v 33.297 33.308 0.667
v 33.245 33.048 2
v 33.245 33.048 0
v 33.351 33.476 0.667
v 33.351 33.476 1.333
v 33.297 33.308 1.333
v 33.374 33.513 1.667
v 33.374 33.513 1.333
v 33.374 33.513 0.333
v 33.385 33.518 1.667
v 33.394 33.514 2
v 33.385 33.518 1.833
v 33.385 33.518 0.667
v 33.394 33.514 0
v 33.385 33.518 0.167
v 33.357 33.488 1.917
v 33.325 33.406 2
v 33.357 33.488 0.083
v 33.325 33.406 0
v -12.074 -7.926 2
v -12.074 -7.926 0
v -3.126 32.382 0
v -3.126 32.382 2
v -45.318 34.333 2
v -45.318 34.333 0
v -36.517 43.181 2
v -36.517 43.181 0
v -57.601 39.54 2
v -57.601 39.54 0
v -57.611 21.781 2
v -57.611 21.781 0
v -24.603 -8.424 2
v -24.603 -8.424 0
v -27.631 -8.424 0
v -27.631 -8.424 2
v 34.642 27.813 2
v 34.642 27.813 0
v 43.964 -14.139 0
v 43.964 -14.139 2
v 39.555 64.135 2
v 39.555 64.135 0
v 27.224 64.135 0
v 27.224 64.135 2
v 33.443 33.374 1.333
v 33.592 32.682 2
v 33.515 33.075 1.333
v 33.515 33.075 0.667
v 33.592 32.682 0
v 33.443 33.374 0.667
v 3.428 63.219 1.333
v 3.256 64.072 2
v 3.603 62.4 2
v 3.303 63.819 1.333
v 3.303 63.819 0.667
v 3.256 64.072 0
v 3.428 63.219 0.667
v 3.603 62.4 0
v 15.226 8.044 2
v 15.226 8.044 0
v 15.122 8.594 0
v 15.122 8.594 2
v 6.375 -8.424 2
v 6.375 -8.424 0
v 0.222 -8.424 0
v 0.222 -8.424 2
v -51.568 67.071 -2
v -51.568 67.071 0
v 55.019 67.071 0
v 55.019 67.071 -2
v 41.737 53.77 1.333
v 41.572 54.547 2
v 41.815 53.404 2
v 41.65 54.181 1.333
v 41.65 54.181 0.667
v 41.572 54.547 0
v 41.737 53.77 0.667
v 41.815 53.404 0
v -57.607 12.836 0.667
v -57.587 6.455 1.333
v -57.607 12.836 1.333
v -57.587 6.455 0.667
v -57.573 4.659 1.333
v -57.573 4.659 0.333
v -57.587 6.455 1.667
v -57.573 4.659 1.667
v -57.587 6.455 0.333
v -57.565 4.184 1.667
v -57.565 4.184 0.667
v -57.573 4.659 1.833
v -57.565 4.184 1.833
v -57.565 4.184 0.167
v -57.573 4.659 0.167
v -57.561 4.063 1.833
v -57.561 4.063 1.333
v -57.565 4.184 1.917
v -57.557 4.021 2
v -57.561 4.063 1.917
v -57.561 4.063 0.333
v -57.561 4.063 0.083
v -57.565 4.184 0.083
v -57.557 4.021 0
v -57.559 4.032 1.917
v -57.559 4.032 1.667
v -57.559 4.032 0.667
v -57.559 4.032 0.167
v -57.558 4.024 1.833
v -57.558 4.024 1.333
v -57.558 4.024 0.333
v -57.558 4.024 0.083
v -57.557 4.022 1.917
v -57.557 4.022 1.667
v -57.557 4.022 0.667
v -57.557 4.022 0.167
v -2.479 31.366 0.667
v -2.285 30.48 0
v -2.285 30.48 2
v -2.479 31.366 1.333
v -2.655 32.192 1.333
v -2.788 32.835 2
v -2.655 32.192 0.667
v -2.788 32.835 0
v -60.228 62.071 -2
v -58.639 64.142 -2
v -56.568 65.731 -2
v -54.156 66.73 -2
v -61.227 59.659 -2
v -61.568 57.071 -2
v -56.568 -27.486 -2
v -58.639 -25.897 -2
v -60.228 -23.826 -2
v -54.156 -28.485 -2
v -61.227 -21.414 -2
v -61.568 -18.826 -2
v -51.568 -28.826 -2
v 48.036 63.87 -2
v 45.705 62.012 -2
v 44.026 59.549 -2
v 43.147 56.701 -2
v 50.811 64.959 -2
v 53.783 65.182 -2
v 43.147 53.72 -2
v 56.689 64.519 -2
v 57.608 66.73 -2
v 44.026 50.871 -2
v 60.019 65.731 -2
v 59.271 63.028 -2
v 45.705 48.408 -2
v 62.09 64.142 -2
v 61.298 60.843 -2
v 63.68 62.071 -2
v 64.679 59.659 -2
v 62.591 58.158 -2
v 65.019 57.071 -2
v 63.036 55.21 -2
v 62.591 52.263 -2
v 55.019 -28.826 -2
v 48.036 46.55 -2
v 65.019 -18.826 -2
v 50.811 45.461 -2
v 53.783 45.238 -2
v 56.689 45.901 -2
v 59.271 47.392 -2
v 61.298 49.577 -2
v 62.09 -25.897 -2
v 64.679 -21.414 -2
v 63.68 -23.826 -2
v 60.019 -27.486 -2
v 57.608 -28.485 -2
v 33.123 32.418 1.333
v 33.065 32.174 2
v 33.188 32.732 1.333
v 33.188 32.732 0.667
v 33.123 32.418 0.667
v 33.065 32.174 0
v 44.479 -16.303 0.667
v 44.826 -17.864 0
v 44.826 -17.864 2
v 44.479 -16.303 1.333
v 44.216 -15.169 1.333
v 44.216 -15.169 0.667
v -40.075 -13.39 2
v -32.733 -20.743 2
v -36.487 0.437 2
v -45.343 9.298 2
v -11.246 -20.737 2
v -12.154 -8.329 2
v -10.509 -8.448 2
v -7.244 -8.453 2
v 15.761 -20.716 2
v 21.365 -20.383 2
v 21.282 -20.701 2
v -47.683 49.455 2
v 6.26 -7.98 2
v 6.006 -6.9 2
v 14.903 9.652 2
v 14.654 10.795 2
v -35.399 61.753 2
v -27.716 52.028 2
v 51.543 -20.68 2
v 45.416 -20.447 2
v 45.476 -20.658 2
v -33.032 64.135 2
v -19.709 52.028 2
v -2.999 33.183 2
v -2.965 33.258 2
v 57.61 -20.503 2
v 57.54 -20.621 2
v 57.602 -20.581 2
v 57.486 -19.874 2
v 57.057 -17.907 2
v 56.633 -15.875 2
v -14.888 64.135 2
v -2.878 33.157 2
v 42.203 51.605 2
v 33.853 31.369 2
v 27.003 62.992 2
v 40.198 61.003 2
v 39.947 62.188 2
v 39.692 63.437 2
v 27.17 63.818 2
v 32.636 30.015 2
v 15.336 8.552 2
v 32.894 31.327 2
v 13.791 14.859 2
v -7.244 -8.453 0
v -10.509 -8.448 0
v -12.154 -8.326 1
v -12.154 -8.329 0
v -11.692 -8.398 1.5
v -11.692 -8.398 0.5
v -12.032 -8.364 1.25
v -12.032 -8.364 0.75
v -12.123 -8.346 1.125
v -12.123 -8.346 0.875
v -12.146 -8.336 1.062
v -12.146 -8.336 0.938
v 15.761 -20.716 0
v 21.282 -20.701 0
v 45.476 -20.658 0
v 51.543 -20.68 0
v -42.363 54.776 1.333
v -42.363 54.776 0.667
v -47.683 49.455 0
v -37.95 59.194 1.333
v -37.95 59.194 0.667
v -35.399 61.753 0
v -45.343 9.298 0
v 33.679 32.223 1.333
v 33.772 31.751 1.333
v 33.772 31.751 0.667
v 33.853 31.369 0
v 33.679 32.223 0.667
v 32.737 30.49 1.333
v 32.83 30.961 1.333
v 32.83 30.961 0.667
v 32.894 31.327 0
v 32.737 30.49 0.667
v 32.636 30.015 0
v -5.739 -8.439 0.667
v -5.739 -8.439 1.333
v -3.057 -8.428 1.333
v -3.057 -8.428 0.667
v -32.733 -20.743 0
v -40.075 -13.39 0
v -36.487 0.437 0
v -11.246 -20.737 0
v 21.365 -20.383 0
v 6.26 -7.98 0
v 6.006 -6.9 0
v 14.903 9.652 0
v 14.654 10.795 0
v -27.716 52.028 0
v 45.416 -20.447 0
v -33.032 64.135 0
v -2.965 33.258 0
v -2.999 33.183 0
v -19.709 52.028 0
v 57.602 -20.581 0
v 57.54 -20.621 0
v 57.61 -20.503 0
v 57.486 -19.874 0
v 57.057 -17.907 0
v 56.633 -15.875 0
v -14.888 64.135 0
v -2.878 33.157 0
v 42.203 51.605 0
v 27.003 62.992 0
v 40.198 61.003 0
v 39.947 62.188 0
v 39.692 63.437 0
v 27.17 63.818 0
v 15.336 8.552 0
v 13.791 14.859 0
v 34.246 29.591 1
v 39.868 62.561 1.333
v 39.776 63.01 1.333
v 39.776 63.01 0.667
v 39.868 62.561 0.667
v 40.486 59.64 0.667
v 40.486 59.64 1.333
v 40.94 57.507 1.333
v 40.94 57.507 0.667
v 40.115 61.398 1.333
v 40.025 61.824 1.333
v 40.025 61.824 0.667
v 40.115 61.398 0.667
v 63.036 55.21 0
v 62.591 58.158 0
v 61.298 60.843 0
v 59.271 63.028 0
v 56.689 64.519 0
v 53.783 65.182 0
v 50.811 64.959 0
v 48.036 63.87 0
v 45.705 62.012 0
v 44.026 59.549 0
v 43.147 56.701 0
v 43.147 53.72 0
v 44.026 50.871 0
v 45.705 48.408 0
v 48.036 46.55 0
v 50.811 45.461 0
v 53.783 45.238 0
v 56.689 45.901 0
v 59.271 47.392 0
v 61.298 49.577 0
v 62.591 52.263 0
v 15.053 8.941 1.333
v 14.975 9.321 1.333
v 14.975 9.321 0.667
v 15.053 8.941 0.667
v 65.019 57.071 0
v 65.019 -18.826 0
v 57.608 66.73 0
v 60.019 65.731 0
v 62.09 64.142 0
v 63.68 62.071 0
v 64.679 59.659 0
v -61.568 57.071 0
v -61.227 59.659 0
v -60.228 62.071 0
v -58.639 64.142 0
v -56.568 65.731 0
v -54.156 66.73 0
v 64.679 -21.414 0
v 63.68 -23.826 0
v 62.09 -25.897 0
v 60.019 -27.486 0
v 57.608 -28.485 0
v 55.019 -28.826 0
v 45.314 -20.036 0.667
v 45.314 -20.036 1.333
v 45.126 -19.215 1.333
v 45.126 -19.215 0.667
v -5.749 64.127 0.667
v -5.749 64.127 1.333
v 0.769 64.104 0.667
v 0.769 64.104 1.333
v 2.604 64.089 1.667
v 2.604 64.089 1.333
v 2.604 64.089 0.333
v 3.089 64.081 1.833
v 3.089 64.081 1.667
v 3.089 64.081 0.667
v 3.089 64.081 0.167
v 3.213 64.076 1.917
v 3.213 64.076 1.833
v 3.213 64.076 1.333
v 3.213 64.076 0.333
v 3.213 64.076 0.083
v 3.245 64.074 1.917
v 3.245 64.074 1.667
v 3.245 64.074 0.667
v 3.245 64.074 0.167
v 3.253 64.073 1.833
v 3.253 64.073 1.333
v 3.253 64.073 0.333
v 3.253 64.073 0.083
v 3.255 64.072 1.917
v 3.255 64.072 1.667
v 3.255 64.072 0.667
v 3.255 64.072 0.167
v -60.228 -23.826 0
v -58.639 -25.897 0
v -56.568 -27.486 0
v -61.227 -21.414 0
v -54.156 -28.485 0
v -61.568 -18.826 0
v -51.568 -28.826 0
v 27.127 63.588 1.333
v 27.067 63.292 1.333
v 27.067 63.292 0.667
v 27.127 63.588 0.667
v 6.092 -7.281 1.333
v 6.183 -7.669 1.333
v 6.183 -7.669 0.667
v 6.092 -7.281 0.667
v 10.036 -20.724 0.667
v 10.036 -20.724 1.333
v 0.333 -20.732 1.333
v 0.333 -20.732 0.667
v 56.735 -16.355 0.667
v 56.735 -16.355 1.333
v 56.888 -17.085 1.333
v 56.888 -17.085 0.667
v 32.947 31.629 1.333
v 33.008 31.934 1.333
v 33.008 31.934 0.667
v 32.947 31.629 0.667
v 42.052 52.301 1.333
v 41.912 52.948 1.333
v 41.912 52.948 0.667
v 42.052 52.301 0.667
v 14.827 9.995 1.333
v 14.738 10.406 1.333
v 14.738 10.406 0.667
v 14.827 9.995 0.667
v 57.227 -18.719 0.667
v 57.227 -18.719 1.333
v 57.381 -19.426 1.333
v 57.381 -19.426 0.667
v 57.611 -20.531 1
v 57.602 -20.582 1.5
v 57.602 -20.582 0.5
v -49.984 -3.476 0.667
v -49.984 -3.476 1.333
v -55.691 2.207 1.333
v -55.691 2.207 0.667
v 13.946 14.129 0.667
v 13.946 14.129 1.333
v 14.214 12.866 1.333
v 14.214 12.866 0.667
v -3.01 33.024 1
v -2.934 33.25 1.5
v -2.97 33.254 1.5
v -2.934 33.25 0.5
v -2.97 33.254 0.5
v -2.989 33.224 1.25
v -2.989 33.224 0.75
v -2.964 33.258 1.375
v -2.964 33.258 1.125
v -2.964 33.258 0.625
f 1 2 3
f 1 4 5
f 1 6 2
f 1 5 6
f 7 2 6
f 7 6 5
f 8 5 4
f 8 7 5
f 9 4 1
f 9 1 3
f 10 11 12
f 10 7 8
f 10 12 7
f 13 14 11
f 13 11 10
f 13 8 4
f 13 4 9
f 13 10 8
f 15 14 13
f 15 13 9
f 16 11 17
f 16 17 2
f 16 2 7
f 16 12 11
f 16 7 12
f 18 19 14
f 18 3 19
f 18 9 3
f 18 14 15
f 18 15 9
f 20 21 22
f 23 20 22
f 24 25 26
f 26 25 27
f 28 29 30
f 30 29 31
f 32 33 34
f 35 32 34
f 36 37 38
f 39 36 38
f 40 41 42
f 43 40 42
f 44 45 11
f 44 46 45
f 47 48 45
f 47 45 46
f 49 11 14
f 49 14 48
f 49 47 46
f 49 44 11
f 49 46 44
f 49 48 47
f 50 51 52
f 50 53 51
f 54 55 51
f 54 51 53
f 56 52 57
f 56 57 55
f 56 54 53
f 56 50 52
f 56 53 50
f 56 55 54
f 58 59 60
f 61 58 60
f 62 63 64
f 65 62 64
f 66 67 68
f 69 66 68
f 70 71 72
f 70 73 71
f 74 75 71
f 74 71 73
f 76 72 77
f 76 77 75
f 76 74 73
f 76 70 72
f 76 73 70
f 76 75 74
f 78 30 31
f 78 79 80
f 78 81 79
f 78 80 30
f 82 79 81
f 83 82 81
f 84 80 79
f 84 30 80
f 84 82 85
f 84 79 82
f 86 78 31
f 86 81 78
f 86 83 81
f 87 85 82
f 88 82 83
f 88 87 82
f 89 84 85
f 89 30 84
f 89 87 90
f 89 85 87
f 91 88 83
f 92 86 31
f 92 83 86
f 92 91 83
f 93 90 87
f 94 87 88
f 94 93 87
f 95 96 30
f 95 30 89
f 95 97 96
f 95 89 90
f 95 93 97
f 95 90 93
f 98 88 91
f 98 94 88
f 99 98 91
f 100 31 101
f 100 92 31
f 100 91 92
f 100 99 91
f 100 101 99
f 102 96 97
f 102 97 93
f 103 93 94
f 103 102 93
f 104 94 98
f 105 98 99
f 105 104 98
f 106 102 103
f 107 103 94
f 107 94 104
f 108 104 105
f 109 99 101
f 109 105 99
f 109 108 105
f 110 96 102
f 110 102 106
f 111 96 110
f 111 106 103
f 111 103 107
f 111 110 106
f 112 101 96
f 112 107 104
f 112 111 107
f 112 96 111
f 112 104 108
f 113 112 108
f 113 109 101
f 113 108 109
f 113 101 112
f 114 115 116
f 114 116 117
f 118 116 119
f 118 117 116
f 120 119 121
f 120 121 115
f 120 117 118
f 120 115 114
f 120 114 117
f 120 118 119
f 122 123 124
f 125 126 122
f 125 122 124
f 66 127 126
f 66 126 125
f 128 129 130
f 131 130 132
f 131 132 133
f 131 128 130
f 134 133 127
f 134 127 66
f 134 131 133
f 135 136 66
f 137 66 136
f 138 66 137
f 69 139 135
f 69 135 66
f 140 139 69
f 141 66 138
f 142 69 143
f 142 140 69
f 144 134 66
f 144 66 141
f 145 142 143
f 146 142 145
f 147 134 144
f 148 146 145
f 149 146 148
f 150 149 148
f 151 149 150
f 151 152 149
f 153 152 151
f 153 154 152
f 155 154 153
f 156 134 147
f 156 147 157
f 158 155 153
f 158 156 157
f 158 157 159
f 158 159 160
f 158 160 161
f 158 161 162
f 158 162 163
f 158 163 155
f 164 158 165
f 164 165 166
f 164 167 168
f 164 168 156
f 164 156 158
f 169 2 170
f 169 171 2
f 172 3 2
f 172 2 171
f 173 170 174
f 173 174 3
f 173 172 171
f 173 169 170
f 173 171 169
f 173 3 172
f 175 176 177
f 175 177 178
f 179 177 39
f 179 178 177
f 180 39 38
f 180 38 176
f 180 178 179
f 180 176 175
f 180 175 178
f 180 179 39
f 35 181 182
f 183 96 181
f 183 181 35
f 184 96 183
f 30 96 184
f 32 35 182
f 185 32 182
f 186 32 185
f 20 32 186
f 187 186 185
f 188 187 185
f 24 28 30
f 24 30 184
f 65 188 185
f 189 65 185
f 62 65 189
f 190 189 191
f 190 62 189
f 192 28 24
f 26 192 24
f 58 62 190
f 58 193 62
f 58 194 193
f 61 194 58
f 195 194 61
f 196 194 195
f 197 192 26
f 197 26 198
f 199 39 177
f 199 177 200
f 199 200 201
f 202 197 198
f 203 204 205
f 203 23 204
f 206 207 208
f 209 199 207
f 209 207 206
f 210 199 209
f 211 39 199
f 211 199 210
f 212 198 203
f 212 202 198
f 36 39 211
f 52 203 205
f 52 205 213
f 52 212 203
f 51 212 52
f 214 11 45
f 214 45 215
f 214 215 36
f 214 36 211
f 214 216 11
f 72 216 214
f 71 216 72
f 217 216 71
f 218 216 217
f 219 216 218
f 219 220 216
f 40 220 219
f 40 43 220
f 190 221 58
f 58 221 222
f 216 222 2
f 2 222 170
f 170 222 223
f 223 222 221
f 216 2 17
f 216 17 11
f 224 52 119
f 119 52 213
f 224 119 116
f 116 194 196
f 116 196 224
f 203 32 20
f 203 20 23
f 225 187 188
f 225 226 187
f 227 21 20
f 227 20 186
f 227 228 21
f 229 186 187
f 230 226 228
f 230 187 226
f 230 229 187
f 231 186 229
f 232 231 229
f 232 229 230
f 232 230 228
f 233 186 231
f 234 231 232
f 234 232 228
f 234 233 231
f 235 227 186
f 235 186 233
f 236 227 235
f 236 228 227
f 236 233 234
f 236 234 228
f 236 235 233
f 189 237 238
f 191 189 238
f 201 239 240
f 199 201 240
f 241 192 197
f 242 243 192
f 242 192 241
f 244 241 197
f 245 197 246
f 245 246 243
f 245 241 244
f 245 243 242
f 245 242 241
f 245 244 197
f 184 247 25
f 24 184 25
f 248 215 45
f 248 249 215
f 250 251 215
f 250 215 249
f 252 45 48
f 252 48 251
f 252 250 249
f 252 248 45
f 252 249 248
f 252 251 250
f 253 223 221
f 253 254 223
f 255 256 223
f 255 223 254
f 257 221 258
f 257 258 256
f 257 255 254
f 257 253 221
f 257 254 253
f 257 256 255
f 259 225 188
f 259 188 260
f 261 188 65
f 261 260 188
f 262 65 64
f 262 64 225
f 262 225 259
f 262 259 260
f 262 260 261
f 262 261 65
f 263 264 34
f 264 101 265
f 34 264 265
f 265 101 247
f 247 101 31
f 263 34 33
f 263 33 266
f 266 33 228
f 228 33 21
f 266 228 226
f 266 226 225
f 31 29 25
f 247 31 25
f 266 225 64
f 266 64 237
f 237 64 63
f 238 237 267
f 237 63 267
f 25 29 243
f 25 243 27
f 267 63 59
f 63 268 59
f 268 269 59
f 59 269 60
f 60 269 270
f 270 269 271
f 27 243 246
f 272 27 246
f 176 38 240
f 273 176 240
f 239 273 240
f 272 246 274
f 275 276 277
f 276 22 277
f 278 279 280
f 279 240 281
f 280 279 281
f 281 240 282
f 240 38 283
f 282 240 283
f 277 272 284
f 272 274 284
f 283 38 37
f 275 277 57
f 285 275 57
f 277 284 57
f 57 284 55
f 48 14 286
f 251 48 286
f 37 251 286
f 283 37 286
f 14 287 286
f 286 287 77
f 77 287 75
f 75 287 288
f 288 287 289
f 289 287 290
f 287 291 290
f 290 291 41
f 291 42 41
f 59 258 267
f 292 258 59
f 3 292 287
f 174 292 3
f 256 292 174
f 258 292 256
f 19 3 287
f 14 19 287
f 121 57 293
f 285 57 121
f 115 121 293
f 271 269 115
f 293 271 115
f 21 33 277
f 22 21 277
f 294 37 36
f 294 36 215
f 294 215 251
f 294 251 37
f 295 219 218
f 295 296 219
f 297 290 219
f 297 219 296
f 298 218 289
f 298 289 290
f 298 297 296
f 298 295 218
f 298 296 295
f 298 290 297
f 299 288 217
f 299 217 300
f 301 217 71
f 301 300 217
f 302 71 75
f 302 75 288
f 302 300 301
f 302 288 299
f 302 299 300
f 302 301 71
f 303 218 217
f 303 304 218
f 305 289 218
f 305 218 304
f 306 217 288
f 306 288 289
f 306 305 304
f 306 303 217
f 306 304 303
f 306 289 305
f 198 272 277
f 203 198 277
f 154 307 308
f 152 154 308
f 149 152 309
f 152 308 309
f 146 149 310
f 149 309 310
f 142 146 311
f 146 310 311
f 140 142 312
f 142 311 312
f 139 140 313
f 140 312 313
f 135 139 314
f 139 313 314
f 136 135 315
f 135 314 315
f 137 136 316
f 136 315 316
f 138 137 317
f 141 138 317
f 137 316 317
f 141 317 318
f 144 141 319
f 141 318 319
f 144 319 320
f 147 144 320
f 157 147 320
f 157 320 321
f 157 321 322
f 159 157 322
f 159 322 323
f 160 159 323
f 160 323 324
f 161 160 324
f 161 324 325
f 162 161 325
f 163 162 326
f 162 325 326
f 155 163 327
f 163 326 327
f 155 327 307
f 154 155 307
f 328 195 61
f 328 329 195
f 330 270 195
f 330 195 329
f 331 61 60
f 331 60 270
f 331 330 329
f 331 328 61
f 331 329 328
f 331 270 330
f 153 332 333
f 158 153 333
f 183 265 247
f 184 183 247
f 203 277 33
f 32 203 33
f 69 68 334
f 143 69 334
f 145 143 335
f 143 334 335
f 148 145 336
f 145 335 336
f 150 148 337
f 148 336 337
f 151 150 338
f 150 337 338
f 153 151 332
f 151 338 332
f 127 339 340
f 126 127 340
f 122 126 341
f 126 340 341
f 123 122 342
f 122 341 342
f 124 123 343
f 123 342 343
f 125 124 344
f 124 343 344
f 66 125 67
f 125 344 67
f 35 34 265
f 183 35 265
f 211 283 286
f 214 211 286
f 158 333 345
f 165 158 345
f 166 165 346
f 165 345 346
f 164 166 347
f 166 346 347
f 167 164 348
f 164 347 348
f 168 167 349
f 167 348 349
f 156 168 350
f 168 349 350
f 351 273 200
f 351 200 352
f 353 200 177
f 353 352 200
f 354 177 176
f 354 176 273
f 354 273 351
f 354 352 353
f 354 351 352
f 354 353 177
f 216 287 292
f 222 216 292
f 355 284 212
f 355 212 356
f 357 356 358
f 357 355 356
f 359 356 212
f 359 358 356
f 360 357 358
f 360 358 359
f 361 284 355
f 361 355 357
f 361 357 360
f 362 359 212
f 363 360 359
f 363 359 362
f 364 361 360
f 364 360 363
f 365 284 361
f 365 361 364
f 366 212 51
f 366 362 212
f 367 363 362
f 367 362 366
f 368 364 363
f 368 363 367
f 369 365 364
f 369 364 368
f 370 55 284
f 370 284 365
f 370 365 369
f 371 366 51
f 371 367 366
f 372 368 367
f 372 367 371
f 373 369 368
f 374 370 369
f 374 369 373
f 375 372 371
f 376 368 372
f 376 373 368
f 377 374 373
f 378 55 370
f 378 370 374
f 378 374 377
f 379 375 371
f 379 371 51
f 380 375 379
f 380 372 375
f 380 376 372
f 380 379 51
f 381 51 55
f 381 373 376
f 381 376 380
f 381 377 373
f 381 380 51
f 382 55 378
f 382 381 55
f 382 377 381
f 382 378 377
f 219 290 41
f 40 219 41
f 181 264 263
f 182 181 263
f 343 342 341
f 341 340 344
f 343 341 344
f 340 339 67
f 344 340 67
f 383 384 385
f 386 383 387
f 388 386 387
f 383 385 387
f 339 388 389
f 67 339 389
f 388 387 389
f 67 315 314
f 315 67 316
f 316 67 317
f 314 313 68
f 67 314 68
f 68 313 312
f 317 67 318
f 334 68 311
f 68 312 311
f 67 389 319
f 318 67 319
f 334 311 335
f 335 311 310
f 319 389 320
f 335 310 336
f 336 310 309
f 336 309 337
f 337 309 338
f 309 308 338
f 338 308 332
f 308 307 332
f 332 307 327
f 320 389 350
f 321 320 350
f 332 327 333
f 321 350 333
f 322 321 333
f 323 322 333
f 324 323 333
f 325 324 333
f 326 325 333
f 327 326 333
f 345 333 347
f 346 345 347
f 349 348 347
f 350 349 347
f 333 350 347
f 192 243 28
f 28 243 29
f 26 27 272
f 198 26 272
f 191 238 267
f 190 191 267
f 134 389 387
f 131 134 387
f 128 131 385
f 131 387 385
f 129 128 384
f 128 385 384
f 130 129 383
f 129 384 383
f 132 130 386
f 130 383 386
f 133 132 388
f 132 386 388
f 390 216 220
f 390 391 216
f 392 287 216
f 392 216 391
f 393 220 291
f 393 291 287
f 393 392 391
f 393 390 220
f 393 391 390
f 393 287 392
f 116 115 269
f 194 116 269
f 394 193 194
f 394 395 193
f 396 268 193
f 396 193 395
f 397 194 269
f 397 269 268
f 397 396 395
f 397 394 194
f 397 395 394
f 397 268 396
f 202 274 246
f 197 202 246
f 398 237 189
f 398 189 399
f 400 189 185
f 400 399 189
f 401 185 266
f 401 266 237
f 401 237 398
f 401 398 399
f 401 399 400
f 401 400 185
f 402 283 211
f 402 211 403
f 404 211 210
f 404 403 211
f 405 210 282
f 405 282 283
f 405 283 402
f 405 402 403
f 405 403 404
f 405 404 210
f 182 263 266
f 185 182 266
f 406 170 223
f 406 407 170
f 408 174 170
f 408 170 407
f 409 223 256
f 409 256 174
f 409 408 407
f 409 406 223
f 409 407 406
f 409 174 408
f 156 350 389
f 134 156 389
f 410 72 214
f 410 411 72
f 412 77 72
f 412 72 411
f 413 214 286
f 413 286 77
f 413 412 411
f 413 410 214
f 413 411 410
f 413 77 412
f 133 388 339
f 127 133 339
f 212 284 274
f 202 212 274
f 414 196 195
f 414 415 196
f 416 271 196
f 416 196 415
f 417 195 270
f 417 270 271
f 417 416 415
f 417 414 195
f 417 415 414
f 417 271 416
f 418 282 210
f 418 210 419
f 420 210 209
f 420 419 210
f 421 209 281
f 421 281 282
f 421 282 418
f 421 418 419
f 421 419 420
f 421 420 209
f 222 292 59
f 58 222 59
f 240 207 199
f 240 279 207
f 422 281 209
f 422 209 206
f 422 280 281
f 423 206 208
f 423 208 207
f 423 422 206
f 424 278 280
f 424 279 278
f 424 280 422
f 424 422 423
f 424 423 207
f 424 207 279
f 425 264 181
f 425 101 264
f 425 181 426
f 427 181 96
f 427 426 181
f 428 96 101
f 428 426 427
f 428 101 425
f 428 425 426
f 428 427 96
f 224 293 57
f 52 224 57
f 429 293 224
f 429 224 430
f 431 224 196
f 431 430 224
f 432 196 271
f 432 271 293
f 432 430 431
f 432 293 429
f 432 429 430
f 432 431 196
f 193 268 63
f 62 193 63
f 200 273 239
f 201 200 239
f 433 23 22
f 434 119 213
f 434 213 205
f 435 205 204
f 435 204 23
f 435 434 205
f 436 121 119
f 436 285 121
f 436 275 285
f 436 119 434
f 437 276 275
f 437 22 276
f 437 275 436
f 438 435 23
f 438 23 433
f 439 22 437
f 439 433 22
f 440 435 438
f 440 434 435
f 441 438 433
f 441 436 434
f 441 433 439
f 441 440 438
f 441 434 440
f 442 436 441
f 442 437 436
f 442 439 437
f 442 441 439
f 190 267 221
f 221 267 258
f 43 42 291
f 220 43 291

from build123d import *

# Parameters (mm, degrees)
F1_DEPTH = 2
F3_DEPTH = 2
F4_R     = 10
F5_DEPTH = 2


# Not quite as in the source:
# - ends of sketch curves that miss each other by under 0.0002 mm in the source are joined


with BuildPart() as f1:
    # F0 (on Top) → F1 (new body)
    with BuildSketch(Plane.XY):
        with BuildLine():
            Line((-57.600874, 39.53975), (-57.610532, 21.78092))
            add(Edge.make_bspline(
                [(-57.556676, 4.021483), (-57.591601, 4.021748), (-57.615837, 12.013561), (-57.610532, 21.78092)],
                knots=[0, 0, 0, 0, 1, 1, 1, 1], degree=3))
            add(Edge.make_bspline(
                [(-40.075238, -13.389783), (-52.206941, -1.240682), (-57.489675, 4.020846), (-57.556676, 4.021483)],
                knots=[0, 0, 0, 0, 1, 1, 1, 1], degree=3))
            Line((-40.075238, -13.389783), (-32.732625, -20.74289))
            Line((-32.732625, -20.74289), (-11.246228, -20.737043))
            add(Edge.make_bspline(
                [(15.761272, -20.715876), (12.72466, -20.724263), (0.571289, -20.733815), (-11.246228, -20.737043)],
                knots=[0, 0, 0, 0, 1, 1, 1, 1], degree=3))
            Line((15.761272, -20.715876), (21.282367, -20.700583))
            Line((21.282367, -20.700583), (21.365348, -20.383083))
            Line((21.365348, -20.383083), (32.636497, 30.01475))
            add(Edge.make_bspline(
                [(32.894223, 31.327084), (32.850424, 31.047684), (32.734449, 30.457134), (32.636497, 30.01475)],
                knots=[0, 0, 0, 0, 1, 1, 1, 1], degree=3))
            add(Edge.make_bspline(
                [(33.065223, 32.17375), (33.014973, 31.987484), (32.938019, 31.606484), (32.894223, 31.327084)],
                knots=[0, 0, 0, 0, 1, 1, 1, 1], degree=3))
            add(Edge.make_bspline(
                [(33.244505, 33.048222), (33.196152, 32.753529), (33.115473, 32.360017), (33.065223, 32.17375)],
                knots=[0, 0, 0, 0, 1, 1, 1, 1], degree=3))
            add(Edge.make_bspline(
                [(33.393587, 33.513889), (33.35994, 33.552468), (33.292857, 33.342918), (33.244505, 33.048222)],
                knots=[0, 0, 0, 0, 1, 1, 1, 1], degree=3))
            add(Edge.make_bspline(
                [(33.592469, 32.68175), (33.516716, 33.10085), (33.427223, 33.475313), (33.393587, 33.513889)],
                knots=[0, 0, 0, 0, 1, 1, 1, 1], degree=3))
            add(Edge.make_bspline(
                [(33.853308, 31.369417), (33.785593, 31.6721), (33.668211, 32.26265), (33.592469, 32.68175)],
                knots=[0, 0, 0, 0, 1, 1, 1, 1], degree=3))
            add(Edge.make_bspline(
                [(34.24613, 29.591417), (34.097794, 30.266634), (33.921026, 31.066734), (33.853308, 31.369417)],
                knots=[0, 0, 0, 0, 1, 1, 1, 1], degree=3))
            add(Edge.make_bspline(
                [(34.642132, 27.813417), (34.572663, 28.1161), (34.394466, 28.9162), (34.24613, 29.591417)],
                knots=[0, 0, 0, 0, 1, 1, 1, 1], degree=3))
            Line((34.642132, 27.813417), (43.963829, -14.138916))
            add(Edge.make_bspline(
                [(44.826481, -17.86425), (44.411157, -15.981406), (44.235923, -15.22469), (43.963829, -14.138916)],
                knots=[0, 0, 0, 0, 1, 1, 1, 1], degree=3))
            add(Edge.make_bspline(
                [(45.416177, -20.446583), (45.347208, -20.200915), (45.191818, -19.52048), (44.826481, -17.86425)],
                knots=[0, 0, 0, 0, 1, 1, 1, 1], degree=3))
            Line((45.416177, -20.446583), (45.475594, -20.65825))
            Line((45.475594, -20.65825), (51.543384, -20.679972))
            add(Edge.make_bspline(
                [(57.611164, -20.530527), (57.611164, -20.700927), (57.583613, -20.701604), (51.543384, -20.679972)],
                knots=[0, 0, 0, 0, 1, 1, 1, 1], degree=3))
            add(Edge.make_bspline(
                [(57.486095, -19.873802), (57.554887, -20.140857), (57.611164, -20.436386), (57.611164, -20.530527)],
                knots=[0, 0, 0, 0, 1, 1, 1, 1], degree=3))
            add(Edge.make_bspline(
                [(57.057166, -17.90658), (57.224288, -18.721497), (57.417304, -19.606745), (57.486095, -19.873802)],
                knots=[0, 0, 0, 0, 1, 1, 1, 1], degree=3))
            add(Edge.make_bspline(
                [(56.632883, -15.87458), (56.699119, -16.177264), (56.890042, -17.091664), (57.057166, -17.90658)],
                knots=[0, 0, 0, 0, 1, 1, 1, 1], degree=3))
            Line((56.632883, -15.87458), (42.202773, 51.604753))
            add(Edge.make_bspline(
                [(41.814745, 53.403919), (41.881251, 53.089594), (42.055857, 52.27997), (42.202773, 51.604753)],
                knots=[0, 0, 0, 0, 1, 1, 1, 1], degree=3))
            add(Edge.make_bspline(
                [(41.571733, 54.546919), (41.638893, 54.232594), (41.748247, 53.718244), (41.814745, 53.403919)],
                knots=[0, 0, 0, 0, 1, 1, 1, 1], degree=3))
            add(Edge.make_bspline(
                [(40.19839, 61.002752), (40.407617, 60.004619), (40.846698, 57.940575), (41.571733, 54.546919)],
                knots=[0, 0, 0, 0, 1, 1, 1, 1], degree=3))
            add(Edge.make_bspline(
                [(39.946549, 62.188085), (40.011853, 61.885402), (40.12518, 61.352002), (40.19839, 61.002752)],
                knots=[0, 0, 0, 0, 1, 1, 1, 1], degree=3))
            add(Edge.make_bspline(
                [(39.691567, 63.436919), (39.766505, 63.052744), (39.881255, 62.490769), (39.946549, 62.188085)],
                knots=[0, 0, 0, 0, 1, 1, 1, 1], degree=3))
            Line((39.691567, 63.436919), (39.55532, 64.135419))
            Line((39.55532, 64.135419), (33.389412, 64.135419))
            Line((33.389412, 64.135419), (27.223504, 64.135419))
            Line((27.223504, 64.135419), (27.169883, 63.817919))
            add(Edge.make_bspline(
                [(27.003116, 62.992419), (27.065346, 63.271819), (27.140385, 63.643294), (27.169883, 63.817919)],
                knots=[0, 0, 0, 0, 1, 1, 1, 1], degree=3))
            Line((27.003116, 62.992419), (15.335584, 8.551753))
            Line((15.335584, 8.551753), (15.226041, 8.043753))
            Line((15.226041, 8.043753), (15.121547, 8.594086))
            add(Edge.make_bspline(
                [(14.902964, 9.65242), (14.96571, 9.37302), (15.064074, 8.89677), (15.121547, 8.594086)],
                knots=[0, 0, 0, 0, 1, 1, 1, 1], degree=3))
            add(Edge.make_bspline(
                [(14.65394, 10.79542), (14.728159, 10.44617), (14.840215, 9.93182), (14.902964, 9.65242)],
                knots=[0, 0, 0, 0, 1, 1, 1, 1], degree=3))
            add(Edge.make_bspline(
                [(13.790663, 14.85942), (13.90813, 14.305525), (14.109002, 13.359899), (14.65394, 10.79542)],
                knots=[0, 0, 0, 0, 1, 1, 1, 1], degree=3))
            Line((13.790663, 14.85942), (3.603226, 62.399752))
            add(Edge.make_bspline(
                [(3.255508, 64.071919), (3.255677, 64.036994), (3.41217, 63.284519), (3.603226, 62.399752)],
                knots=[0, 0, 0, 0, 1, 1, 1, 1], degree=3))
            add(Edge.make_bspline(
                [(-14.888194, 64.135419), (-4.909346, 64.135419), (3.25532, 64.106844), (3.255508, 64.071919)],
                knots=[0, 0, 0, 0, 1, 1, 1, 1], degree=3))
            Line((-14.888194, 64.135419), (-33.031551, 64.135419))
            Line((-33.031551, 64.135419), (-35.398694, 61.752788))
            add(Edge.make_bspline(
                [(-47.683354, 49.454953), (-42.228717, 54.908316), (-36.700618, 60.442341), (-35.398694, 61.752788)],
                knots=[0, 0, 0, 0, 1, 1, 1, 1], degree=3))
            Line((-47.683354, 49.454953), (-57.600874, 39.53975))
        make_face()
        with BuildLine():
            Line((6.375168, -8.424191), (0.221996, -8.424191))
            add(Edge.make_bspline(
                [(-7.243511, -8.453309), (-6.521727, -8.43746), (-3.162249, -8.424353), (0.221996, -8.424191)],
                knots=[0, 0, 0, 0, 1, 1, 1, 1], degree=3))
            add(Edge.make_bspline(
                [(-12.154177, -8.326219), (-12.154177, -8.432404), (-9.462714, -8.502061), (-7.243511, -8.453309)],
                knots=[0, 0, 0, 0, 1, 1, 1, 1], degree=3))
            add(Edge.make_bspline(
                [(-12.074445, -7.925738), (-12.118297, -8.094121), (-12.154177, -8.274339), (-12.154177, -8.326219)],
                knots=[0, 0, 0, 0, 1, 1, 1, 1], degree=3))
            Line((-12.074445, -7.925738), (-3.125565, 32.382041))
            add(Edge.make_bspline(
                [(-3.010177, 33.024095), (-3.010177, 32.925223), (-3.062102, 32.636298), (-3.125565, 32.382041)],
                knots=[0, 0, 0, 0, 1, 1, 1, 1], degree=3))
            add(Edge.make_bspline(
                [(-2.787964, 32.835209), (-2.881087, 33.302508), (-3.010177, 33.412077), (-3.010177, 33.024095)],
                knots=[0, 0, 0, 0, 1, 1, 1, 1], degree=3))
            add(Edge.make_bspline(
                [(-2.284888, 30.480139), (-2.479074, 31.355119), (-2.685944, 32.323547), (-2.787964, 32.835209)],
                knots=[0, 0, 0, 0, 1, 1, 1, 1], degree=3))
            Line((-2.284888, 30.480139), (6.006286, -6.900191))
            add(Edge.make_bspline(
                [(6.260018, -7.979691), (6.196685, -7.735216), (6.082504, -7.249441), (6.006286, -6.900191)],
                knots=[0, 0, 0, 0, 1, 1, 1, 1], degree=3))
            Line((6.260018, -7.979691), (6.375168, -8.424191))
        make_face(mode=Mode.SUBTRACT)
        Polygon((-27.716271, 52.028087), (-19.709447, 52.028087), (-24.603371, -8.423914), (-26.117335, -8.423914), (-27.631297, -8.423914), (-36.487388, 0.43695), (-45.343476, 9.297817), (-45.318269, 34.333354), (-36.51727, 43.180719), align=None, mode=Mode.SUBTRACT)
    extrude(amount=F1_DEPTH)


with BuildPart() as f3:
    # F2 (on face) → F3 (new body)
    with BuildSketch(Plane(origin=(0, 0, 0), x_dir=(1, 0, 0), z_dir=(0, 0, -1))):
        with BuildLine():
            ThreePointArc((-61.5682080388, -57.0710578561), (-58.6392758507, -64.1421256679), (-51.5682080388, -67.0710578561))
            Line((-51.5682080388, -67.0710578561), (55.0194212794, -67.0710578561))
            ThreePointArc((55.0194212794, -67.0710578561), (62.0904890913, -64.1421256679), (65.0194212794, -57.0710578561))
            Line((65.0194212794, -57.0710578561), (65.0194212794, 18.8257021457))
            ThreePointArc((65.0194212794, 18.8257021457), (62.0904890913, 25.8967699576), (55.0194212794, 28.8257021457))
            Line((55.0194212794, 28.8257021457), (-51.5682080388, 28.8257021457))
            ThreePointArc((-51.5682080388, 28.8257021457), (-58.6392758507, 25.8967699576), (-61.5682080388, 18.8257021457))
            Line((-61.5682080388, 18.8257021457), (-61.5682080388, -57.0710578561))
        make_face()
    extrude(amount=F3_DEPTH)

    # F4 (on face) → F5 (cut)
    with BuildSketch(Plane.XY):
        with Locations((53.0357174575, 55.2100874484)):
            Circle(F4_R)
    extrude(amount=-F5_DEPTH, mode=Mode.SUBTRACT)


solid = Compound([f1.part, f3.part])
